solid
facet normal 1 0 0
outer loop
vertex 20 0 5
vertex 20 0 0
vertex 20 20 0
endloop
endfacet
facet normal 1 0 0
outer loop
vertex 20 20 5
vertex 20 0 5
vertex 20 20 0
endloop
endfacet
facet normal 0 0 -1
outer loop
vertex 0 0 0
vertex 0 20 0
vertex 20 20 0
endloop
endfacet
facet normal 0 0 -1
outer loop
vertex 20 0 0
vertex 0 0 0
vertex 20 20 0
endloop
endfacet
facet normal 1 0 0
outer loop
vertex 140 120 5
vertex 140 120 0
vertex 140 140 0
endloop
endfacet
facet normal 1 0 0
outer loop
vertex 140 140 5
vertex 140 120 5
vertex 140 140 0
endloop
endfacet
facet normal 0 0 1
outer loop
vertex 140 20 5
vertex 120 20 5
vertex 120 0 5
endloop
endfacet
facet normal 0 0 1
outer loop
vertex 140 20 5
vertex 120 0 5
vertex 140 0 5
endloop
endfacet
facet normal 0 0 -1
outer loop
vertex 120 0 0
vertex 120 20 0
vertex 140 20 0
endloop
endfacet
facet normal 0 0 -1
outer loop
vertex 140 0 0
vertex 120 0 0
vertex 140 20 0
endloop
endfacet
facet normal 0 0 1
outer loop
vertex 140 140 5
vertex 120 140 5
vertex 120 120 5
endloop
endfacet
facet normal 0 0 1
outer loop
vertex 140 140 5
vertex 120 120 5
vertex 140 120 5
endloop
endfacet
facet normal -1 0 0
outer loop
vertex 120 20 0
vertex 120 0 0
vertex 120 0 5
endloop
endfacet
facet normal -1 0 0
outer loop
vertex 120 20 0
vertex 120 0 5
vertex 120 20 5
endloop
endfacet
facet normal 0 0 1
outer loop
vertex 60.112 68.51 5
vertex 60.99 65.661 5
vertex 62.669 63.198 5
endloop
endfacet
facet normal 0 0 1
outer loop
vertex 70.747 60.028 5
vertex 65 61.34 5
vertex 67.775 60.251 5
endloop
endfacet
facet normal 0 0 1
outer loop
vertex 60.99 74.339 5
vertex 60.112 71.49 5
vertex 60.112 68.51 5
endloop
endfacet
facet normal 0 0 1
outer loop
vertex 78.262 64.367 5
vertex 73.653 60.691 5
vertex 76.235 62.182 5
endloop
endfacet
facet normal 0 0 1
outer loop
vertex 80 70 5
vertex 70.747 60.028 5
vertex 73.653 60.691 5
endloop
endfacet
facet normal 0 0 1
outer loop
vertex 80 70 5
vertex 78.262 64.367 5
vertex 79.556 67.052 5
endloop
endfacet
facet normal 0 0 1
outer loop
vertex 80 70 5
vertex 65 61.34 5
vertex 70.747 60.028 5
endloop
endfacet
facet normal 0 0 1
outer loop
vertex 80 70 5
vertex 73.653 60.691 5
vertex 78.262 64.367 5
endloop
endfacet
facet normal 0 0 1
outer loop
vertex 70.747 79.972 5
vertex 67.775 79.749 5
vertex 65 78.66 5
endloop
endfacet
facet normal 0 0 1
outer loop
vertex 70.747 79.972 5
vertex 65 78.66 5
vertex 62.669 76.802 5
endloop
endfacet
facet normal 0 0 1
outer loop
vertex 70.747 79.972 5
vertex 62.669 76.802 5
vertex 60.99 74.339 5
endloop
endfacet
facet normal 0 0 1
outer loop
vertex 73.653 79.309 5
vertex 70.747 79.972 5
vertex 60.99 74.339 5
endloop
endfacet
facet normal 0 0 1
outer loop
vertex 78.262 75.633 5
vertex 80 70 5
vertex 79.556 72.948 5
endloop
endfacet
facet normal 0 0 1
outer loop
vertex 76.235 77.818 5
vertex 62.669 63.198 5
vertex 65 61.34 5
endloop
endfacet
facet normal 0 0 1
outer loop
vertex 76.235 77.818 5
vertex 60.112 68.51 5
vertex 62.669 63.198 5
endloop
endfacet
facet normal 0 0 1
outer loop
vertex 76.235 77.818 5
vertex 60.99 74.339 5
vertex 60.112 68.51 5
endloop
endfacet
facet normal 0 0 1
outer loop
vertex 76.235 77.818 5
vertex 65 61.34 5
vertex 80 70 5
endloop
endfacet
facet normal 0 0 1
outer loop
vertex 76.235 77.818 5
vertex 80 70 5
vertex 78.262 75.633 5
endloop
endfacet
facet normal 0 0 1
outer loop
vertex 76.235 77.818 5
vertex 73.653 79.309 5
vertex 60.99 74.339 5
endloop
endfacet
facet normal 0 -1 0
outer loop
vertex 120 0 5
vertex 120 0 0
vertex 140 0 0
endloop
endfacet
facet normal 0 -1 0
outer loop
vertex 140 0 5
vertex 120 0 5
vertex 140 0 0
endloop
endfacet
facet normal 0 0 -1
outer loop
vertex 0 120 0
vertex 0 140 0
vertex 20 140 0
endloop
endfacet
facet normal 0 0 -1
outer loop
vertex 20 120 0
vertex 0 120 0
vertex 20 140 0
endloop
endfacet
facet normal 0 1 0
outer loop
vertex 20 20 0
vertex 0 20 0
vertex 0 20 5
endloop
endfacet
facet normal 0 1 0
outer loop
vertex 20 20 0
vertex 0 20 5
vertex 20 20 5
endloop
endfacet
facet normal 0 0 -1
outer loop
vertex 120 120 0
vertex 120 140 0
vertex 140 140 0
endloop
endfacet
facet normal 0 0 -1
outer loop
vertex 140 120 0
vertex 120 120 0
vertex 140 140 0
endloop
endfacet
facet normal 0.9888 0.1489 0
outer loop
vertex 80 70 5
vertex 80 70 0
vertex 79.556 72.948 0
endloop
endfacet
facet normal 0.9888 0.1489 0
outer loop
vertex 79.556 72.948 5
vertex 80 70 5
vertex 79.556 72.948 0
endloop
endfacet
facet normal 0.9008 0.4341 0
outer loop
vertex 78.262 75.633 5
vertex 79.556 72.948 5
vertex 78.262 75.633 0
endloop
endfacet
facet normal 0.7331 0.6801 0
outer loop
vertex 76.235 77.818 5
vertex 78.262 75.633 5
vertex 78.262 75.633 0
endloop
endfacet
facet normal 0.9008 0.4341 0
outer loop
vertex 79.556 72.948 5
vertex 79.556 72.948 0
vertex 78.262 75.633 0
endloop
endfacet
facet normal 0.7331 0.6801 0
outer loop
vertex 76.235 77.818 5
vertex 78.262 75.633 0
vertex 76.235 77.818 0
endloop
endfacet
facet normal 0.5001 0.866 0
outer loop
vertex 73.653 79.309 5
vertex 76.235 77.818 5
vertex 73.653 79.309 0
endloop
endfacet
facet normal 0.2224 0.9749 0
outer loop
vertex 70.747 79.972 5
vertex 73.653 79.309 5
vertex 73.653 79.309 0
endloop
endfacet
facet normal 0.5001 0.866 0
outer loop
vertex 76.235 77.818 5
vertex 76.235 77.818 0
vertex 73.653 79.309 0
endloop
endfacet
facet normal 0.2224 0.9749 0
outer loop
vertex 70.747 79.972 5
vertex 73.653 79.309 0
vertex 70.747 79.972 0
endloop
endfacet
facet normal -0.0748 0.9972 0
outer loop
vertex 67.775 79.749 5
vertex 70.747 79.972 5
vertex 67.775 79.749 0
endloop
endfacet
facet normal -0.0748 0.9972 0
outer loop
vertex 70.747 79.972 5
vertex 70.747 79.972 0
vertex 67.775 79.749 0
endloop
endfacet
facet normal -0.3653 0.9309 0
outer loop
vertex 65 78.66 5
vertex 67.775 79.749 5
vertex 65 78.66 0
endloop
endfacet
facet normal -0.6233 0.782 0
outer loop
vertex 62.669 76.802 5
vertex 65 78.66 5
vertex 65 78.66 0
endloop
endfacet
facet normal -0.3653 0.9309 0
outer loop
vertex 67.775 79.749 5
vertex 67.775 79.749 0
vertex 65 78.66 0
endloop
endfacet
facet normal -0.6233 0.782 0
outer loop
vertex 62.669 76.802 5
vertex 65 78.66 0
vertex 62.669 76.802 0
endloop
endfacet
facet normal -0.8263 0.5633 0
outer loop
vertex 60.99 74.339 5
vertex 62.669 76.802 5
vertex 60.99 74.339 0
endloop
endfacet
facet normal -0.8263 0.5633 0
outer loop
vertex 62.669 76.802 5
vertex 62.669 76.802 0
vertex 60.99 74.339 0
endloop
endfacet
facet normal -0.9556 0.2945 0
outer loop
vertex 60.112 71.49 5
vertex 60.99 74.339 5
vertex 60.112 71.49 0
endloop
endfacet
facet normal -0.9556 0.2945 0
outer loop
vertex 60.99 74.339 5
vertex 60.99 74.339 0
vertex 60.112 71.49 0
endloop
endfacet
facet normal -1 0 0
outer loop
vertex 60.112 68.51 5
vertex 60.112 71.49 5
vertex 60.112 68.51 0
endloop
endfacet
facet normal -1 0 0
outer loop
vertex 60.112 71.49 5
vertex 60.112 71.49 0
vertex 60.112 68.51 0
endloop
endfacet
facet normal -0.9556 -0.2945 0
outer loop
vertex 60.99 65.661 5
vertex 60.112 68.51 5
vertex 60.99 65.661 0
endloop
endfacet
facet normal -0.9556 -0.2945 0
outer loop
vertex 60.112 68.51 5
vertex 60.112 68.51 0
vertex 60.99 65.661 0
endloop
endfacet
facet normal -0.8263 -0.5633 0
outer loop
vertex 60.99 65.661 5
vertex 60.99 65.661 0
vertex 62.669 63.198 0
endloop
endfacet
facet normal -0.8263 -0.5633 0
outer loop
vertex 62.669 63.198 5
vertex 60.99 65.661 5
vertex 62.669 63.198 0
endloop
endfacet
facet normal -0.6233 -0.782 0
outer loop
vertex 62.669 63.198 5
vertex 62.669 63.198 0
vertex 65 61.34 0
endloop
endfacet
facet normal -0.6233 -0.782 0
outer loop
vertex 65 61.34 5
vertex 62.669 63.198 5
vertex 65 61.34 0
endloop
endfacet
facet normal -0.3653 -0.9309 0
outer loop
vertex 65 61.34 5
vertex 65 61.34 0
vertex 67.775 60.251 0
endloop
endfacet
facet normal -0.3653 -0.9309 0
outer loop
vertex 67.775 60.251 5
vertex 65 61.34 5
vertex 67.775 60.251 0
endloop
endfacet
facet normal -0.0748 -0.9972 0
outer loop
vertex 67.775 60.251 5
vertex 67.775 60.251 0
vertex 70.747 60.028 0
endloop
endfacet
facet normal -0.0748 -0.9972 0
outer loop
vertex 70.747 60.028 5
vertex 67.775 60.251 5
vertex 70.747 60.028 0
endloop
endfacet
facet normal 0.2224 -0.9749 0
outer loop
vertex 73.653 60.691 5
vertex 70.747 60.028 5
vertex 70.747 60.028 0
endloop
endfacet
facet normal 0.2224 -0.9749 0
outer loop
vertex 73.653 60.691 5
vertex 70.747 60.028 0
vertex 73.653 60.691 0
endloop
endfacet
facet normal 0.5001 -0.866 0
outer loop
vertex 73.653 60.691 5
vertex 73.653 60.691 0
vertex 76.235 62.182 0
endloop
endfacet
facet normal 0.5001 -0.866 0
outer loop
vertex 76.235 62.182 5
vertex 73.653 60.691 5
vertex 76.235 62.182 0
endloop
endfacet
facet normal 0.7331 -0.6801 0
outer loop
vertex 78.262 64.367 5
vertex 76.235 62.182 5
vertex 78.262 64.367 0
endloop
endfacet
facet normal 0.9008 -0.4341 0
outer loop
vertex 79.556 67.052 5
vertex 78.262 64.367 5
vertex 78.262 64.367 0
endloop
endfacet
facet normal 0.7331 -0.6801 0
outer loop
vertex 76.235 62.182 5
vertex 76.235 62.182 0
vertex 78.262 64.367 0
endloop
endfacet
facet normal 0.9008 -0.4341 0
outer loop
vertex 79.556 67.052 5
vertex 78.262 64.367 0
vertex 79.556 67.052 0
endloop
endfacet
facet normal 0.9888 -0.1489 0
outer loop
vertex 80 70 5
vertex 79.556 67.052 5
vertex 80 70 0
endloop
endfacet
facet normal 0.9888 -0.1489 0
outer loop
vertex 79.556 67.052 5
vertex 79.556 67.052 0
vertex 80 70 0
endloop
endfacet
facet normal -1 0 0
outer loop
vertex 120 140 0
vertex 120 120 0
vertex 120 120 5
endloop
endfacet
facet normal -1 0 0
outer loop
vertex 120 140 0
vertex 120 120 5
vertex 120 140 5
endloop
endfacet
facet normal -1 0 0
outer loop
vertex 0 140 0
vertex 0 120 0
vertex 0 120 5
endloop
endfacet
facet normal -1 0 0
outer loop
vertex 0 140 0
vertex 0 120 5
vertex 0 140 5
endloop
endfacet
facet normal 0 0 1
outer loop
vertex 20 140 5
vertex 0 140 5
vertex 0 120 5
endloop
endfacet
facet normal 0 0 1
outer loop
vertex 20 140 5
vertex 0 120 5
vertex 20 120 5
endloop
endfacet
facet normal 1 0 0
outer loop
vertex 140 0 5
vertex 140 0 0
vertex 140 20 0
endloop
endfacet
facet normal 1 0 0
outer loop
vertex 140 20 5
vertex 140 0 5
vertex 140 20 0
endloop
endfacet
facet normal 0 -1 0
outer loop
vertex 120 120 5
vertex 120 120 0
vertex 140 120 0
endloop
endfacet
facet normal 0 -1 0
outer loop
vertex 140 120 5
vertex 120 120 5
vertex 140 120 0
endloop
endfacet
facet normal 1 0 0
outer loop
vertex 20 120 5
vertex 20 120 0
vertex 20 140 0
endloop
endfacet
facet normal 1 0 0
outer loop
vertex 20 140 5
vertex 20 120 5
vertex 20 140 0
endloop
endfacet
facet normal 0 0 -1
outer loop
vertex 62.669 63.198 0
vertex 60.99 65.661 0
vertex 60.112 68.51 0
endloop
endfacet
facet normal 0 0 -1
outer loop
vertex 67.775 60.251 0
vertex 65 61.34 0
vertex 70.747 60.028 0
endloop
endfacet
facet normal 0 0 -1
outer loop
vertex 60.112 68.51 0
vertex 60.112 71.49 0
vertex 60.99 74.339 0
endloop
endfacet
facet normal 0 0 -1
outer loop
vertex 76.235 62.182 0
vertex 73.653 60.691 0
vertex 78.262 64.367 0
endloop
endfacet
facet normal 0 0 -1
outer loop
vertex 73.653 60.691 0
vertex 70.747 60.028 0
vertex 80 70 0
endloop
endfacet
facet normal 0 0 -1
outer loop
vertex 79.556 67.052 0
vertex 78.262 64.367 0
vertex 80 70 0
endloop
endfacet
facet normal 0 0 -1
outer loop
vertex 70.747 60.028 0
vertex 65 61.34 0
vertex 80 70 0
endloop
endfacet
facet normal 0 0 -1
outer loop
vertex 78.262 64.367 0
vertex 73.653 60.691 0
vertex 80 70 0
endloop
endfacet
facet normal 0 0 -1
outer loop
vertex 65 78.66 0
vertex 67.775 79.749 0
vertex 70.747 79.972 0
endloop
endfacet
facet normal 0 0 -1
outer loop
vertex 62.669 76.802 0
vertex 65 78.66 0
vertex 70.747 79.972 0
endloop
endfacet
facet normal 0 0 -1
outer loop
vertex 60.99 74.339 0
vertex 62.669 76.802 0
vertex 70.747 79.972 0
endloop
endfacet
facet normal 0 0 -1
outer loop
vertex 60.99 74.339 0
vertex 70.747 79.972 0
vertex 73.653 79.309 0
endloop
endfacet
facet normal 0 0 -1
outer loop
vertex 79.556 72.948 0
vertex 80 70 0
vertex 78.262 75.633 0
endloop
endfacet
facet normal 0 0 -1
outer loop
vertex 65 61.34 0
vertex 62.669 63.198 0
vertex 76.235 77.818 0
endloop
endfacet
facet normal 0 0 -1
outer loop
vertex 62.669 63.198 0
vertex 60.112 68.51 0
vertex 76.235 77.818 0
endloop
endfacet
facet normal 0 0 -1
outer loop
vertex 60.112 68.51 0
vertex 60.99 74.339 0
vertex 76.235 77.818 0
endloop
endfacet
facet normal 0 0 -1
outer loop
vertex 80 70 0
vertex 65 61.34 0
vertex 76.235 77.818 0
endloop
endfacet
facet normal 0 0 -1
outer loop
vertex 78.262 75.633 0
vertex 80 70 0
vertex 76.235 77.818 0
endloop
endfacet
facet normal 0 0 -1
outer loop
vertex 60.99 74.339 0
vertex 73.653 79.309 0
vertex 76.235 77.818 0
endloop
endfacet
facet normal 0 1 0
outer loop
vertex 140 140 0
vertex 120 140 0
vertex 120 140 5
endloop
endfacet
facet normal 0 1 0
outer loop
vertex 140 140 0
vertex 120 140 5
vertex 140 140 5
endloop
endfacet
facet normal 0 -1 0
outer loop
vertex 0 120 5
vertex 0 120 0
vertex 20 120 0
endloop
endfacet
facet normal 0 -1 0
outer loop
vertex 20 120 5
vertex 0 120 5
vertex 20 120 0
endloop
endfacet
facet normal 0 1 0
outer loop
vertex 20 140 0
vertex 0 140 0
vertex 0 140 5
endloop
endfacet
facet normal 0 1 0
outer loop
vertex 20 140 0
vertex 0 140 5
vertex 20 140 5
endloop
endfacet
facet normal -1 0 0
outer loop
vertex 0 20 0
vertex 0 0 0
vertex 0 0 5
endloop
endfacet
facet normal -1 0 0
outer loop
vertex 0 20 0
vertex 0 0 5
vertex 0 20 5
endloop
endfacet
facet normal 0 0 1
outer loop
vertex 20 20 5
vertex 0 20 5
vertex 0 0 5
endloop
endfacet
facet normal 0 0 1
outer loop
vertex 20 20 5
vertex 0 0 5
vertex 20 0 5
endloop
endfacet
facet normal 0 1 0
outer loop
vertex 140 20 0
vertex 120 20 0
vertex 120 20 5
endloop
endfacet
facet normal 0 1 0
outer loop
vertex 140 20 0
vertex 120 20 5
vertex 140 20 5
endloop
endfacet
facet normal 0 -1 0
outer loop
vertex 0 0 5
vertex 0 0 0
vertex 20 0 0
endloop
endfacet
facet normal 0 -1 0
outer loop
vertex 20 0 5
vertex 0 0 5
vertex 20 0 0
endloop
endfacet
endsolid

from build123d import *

# Parameters (mm, degrees)
CROQUIS2_R       = 10
EXTRUIR1_DEPTH   = 5
CROQUIS2_W       = 20
CROQUIS2_H       = 20
EXTRUIR1_2_DEPTH = 5
EXTRUIR1_3_DEPTH = 5
EXTRUIR1_4_DEPTH = 5
EXTRUIR1_5_DEPTH = 5


with BuildPart() as part:
    # Croquis2 → Extruir1 (new body)
    with BuildSketch(Plane.XY):
        with Locations((70, 70)):
            Circle(CROQUIS2_R)
    extrude(amount=EXTRUIR1_DEPTH)


with BuildPart() as body_2:
    # Croquis2 → Extruir1 2 (new body)
    with BuildSketch(Plane.XY):
        with Locations((130, 10)):
            Rectangle(CROQUIS2_W, CROQUIS2_H)
    extrude(amount=EXTRUIR1_2_DEPTH)


with BuildPart() as body_3:
    # Croquis2 → Extruir1 3 (new body)
    with BuildSketch(Plane.XY):
        with Locations((10, 10)):
            Rectangle(CROQUIS2_W, CROQUIS2_H)
    extrude(amount=EXTRUIR1_3_DEPTH)


with BuildPart() as body_4:
    # Croquis2 → Extruir1 4 (new body)
    with BuildSketch(Plane.XY):
        with Locations((10, 130)):
            Rectangle(CROQUIS2_W, CROQUIS2_H)
    extrude(amount=EXTRUIR1_4_DEPTH)


with BuildPart() as body_5:
    # Croquis2 → Extruir1 5 (new body)
    with BuildSketch(Plane.XY):
        with Locations((130, 130)):
            Rectangle(CROQUIS2_W, CROQUIS2_H)
    extrude(amount=EXTRUIR1_5_DEPTH)


solid = Compound([part.part, body_2.part, body_3.part, body_4.part, body_5.part])
